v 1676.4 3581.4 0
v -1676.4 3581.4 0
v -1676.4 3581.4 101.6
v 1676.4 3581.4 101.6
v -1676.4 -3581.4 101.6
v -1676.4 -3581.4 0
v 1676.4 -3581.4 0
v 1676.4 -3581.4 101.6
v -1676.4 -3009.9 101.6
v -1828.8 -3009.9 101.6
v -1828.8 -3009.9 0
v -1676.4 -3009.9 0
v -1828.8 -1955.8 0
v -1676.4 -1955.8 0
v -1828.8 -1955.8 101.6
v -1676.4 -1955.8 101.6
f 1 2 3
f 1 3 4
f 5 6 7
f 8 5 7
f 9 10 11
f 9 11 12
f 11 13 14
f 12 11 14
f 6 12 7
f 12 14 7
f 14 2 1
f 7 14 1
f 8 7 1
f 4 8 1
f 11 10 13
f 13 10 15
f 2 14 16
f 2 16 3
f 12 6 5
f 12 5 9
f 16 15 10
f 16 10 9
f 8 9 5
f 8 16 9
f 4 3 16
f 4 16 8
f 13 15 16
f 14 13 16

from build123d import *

# Parameters (mm, degrees)
F0_W     = 3352.8
F0_H     = 7162.8
F1_DEPTH = 101.6
F2_W     = 152.4
F2_H     = 1054.1
F3_DEPTH = 101.6


with BuildPart() as f1:
    # F0 (on Top) → F1 (new body)
    with BuildSketch(Plane.XY):
        Rectangle(F0_W, F0_H)
    extrude(amount=F1_DEPTH)

    # F2 (on face) → F3 (join, through all)
    with BuildSketch(Plane.XY.offset(101.6)):
        with Locations((-1752.6, -2482.85)):
            Rectangle(F2_W, F2_H)
    extrude(amount=-F3_DEPTH)


solid = f1.part
